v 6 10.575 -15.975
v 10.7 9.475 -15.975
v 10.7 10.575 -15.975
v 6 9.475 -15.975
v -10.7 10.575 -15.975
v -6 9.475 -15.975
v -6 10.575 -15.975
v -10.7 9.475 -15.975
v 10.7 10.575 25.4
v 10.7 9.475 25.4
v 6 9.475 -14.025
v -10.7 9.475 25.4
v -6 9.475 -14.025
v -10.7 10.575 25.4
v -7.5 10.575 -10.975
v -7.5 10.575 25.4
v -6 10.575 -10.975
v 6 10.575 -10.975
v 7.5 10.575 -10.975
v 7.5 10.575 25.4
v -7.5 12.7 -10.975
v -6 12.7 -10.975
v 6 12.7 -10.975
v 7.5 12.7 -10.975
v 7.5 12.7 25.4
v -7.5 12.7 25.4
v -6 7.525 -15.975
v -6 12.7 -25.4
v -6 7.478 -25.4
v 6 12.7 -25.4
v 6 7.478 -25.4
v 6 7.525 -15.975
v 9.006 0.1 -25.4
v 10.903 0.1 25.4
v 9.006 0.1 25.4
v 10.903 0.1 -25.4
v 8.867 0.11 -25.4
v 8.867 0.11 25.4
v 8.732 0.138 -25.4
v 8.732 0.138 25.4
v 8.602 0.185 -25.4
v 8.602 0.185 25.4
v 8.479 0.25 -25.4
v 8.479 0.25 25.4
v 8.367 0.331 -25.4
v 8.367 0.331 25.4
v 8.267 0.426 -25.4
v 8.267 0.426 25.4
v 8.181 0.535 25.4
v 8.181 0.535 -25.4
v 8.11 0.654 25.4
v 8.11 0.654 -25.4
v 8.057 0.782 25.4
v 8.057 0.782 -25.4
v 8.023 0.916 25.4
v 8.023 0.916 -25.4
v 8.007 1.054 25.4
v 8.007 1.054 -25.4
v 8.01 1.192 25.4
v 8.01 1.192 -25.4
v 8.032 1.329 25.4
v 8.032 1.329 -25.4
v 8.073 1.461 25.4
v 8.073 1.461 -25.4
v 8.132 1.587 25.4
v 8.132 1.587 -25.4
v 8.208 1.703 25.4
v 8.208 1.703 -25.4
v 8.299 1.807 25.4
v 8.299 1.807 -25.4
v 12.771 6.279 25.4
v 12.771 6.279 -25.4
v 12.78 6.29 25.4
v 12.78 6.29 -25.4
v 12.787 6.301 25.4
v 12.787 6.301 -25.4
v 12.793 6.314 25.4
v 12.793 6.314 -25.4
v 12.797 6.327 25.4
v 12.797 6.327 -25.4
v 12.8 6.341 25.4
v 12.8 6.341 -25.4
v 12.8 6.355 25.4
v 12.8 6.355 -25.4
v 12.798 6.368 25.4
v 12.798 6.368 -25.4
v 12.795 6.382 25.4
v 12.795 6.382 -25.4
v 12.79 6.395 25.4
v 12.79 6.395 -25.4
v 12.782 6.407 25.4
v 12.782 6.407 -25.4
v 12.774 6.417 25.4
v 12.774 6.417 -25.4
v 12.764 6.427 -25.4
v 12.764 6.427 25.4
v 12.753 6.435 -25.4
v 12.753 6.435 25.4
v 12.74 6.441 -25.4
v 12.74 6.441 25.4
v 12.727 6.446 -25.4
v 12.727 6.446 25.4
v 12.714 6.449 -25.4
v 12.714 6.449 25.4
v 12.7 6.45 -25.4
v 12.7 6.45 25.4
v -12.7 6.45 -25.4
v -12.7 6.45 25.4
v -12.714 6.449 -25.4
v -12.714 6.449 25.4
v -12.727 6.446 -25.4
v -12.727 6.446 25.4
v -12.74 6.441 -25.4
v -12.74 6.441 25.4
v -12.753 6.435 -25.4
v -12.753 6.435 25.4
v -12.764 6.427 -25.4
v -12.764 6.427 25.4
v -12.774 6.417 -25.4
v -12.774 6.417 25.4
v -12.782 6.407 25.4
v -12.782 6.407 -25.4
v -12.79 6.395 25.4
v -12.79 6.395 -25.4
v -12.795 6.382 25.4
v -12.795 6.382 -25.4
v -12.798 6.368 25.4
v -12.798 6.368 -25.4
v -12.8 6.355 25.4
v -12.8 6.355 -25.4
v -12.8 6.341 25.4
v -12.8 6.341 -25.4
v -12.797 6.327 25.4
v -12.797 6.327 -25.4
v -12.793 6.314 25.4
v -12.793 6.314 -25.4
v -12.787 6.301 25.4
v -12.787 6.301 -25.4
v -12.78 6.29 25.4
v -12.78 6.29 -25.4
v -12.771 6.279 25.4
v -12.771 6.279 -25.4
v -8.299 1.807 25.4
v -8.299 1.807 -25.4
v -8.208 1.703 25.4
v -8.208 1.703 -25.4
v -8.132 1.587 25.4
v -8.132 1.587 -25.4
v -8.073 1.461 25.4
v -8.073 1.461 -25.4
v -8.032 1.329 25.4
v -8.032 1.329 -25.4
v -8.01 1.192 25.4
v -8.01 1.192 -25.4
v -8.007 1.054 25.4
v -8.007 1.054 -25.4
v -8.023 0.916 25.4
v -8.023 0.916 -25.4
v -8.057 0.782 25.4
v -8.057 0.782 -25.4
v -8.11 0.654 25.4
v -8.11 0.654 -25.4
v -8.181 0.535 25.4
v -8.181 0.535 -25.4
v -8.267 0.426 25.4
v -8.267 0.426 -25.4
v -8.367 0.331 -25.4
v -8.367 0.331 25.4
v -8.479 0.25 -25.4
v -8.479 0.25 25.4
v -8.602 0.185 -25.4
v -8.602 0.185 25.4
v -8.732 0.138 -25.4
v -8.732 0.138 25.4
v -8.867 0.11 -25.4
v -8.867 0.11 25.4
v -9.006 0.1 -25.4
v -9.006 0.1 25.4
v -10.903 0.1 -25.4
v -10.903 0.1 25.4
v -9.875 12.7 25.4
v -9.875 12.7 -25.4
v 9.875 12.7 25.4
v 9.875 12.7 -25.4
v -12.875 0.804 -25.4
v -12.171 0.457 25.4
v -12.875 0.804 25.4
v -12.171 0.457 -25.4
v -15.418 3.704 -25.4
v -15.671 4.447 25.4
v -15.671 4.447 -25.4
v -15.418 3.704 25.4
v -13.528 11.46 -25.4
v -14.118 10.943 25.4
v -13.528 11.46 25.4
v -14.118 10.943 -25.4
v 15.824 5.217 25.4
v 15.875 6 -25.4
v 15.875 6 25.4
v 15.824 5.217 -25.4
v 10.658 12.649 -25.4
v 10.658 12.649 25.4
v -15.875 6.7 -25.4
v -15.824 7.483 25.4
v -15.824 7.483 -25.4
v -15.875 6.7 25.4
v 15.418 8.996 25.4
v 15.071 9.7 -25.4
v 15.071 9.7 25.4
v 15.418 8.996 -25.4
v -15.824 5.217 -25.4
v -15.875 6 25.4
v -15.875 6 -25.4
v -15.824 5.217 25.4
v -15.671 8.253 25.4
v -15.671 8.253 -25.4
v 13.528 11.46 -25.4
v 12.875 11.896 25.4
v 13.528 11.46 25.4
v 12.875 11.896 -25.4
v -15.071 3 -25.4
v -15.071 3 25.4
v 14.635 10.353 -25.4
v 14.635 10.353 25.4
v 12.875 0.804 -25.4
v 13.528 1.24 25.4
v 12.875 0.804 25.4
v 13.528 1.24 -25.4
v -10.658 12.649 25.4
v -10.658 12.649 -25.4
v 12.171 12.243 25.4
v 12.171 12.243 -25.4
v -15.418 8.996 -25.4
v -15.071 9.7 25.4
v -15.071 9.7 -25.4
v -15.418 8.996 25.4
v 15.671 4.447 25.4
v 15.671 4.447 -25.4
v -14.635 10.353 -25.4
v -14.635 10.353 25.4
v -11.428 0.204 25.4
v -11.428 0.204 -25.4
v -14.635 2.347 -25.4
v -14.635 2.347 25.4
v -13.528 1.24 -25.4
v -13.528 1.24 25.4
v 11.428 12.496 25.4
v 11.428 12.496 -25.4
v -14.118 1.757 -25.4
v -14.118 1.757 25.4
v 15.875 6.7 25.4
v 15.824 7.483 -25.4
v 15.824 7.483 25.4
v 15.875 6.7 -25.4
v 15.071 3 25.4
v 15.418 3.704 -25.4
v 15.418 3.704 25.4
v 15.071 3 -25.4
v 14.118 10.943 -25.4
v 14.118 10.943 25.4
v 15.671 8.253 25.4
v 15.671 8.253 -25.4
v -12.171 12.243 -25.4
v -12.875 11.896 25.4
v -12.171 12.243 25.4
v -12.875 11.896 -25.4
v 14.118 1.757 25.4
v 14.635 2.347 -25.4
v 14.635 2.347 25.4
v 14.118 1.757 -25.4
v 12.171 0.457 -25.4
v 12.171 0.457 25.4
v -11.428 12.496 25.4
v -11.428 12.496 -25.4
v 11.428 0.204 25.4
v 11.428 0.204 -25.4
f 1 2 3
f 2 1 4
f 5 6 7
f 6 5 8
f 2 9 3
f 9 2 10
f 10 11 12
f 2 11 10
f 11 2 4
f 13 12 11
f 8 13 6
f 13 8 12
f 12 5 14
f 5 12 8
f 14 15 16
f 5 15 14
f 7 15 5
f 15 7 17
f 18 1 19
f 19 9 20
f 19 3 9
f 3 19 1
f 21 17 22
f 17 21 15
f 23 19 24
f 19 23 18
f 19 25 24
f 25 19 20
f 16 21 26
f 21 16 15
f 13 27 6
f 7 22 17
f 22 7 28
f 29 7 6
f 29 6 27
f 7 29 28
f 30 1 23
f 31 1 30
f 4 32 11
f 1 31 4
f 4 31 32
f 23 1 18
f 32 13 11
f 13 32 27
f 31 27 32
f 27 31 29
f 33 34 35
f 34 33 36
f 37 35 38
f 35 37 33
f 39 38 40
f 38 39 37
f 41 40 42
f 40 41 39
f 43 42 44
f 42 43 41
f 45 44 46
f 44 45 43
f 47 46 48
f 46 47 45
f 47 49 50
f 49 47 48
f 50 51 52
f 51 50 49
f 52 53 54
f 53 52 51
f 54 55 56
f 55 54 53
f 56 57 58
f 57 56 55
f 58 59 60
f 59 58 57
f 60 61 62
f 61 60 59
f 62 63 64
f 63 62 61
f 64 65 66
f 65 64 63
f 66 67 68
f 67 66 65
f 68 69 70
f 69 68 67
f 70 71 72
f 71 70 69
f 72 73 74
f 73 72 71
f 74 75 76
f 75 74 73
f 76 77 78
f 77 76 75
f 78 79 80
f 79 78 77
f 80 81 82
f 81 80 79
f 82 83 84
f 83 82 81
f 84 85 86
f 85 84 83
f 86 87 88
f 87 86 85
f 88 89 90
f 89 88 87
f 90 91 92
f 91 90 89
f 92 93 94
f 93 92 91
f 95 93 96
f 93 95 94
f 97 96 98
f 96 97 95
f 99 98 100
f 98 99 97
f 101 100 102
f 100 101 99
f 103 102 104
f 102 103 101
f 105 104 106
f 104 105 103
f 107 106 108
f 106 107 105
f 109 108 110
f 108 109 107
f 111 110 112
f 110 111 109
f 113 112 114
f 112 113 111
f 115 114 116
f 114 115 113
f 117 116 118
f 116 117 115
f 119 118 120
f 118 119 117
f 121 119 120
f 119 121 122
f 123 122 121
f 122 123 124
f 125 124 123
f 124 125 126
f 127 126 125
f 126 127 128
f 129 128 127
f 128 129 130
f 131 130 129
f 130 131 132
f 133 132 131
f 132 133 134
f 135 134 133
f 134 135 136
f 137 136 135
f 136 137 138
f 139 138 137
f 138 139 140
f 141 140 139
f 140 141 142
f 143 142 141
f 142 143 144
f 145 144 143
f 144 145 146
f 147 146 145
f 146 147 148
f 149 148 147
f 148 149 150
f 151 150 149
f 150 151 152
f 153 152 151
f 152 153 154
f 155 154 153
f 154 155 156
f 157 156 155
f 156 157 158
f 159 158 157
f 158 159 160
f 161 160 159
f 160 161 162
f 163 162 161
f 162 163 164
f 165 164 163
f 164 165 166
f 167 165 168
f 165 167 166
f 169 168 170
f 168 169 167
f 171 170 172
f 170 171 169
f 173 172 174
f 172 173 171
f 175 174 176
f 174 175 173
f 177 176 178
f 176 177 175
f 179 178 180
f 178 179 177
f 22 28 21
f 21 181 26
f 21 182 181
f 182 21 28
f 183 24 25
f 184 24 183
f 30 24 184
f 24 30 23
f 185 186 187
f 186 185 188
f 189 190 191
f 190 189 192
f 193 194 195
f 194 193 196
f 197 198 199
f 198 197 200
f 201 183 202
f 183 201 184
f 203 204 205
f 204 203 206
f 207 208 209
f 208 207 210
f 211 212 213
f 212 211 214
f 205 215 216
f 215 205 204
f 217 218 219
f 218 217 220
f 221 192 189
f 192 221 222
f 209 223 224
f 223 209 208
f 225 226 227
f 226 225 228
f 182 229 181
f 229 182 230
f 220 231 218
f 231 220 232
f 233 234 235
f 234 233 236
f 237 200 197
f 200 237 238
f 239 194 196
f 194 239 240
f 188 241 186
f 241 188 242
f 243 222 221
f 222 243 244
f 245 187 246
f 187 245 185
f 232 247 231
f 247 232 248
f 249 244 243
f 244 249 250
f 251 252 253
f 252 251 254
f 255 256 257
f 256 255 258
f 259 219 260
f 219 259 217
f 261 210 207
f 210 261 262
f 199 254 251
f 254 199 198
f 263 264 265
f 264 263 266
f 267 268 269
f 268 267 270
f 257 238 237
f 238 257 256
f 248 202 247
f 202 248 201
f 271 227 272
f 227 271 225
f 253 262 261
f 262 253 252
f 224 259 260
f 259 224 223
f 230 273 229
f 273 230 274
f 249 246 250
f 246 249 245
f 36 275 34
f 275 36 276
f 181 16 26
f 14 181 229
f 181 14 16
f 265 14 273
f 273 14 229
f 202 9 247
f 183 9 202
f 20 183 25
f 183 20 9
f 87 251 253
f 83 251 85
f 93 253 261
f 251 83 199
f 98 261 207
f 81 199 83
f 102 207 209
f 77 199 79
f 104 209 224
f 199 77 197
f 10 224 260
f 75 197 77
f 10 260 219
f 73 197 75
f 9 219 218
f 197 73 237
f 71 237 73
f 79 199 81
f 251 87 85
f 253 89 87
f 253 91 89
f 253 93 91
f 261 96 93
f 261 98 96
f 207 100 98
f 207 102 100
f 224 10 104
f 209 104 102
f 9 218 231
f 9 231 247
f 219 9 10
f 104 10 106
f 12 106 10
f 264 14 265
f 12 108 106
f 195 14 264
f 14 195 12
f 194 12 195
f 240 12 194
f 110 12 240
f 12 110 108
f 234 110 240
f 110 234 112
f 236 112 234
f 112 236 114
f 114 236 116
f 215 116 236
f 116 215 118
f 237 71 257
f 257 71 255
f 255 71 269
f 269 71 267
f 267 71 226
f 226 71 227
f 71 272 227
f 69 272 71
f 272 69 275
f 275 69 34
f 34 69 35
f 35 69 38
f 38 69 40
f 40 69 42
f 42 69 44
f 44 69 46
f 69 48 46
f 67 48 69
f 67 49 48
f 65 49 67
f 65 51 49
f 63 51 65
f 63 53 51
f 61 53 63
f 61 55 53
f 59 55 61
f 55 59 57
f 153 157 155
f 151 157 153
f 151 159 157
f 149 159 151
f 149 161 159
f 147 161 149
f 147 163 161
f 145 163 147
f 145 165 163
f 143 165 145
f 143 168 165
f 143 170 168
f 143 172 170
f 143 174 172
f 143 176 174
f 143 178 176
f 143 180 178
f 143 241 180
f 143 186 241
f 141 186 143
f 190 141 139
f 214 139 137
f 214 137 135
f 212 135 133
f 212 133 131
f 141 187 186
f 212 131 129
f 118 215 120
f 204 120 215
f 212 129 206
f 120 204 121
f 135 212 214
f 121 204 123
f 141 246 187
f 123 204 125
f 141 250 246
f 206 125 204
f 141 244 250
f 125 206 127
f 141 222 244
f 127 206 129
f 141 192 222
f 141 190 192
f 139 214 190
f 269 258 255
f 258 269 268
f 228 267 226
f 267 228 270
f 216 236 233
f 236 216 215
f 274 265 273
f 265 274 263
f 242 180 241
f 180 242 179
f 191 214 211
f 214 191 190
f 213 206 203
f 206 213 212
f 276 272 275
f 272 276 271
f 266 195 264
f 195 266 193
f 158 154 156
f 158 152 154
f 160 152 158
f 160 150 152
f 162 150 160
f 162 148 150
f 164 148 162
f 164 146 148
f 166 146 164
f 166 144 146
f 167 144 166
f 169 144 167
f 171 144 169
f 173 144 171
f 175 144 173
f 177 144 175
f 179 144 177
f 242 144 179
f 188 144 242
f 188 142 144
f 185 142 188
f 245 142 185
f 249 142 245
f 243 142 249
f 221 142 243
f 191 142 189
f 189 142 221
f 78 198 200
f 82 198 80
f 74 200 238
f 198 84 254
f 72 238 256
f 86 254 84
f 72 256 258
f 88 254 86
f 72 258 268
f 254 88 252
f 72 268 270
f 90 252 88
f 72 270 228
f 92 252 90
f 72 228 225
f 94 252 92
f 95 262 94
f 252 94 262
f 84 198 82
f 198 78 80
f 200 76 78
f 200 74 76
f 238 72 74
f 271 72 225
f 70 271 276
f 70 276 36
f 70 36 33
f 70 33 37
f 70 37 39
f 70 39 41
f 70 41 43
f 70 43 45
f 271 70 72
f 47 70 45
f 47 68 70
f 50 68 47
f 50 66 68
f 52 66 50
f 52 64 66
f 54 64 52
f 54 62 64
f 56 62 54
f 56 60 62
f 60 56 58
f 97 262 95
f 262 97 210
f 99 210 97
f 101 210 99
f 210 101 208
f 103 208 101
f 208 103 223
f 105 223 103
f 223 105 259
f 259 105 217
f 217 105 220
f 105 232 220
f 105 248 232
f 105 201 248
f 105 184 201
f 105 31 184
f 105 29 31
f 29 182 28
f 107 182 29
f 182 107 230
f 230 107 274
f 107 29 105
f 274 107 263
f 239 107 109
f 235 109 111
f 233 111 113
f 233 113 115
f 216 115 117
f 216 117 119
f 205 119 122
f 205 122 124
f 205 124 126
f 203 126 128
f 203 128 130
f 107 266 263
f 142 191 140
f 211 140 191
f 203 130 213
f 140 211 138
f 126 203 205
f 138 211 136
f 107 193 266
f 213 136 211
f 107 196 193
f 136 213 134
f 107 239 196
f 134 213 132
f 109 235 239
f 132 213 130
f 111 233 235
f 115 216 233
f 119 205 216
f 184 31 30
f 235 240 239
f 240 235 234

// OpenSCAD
// file: ../lib/TOGComplexLib1.scad
function tcplx1_multiply(a, b) =
	[a[0]*b[0] - a[1]*b[1], a[0]*b[1] + a[1]*b[0]];
function tcplx1_divide(a, b) =
	let(bot = (b[0]*b[0] + b[1]*b[1]))
	[
		(a[0]*b[0] + a[1]*b[1])/bot,
		(a[1]*b[0] - a[0]*b[1])/bot
	];

assert([-11,23] == tcplx1_multiply([3,2], [1,7]));

assert([-1,3] == tcplx1_multiply([3,1], [0,1]));
assert([-1,3] == tcplx1_multiply([0,1], [3,1]));

echo(tcplx1_divide([-1,3], [3,1]));
assert([0,1] == tcplx1_divide([-1,3], [3,1]));

function tcplx1_normalize(vec) =
	let(veclen = sqrt(vec[0]*vec[0]+vec[1]*vec[1]))
	[vec[0] / veclen, vec[1] / veclen];

function tcplx1_relative_turnvec_vv(v0, v1) =
	tcplx1_divide(tcplx1_normalize(v1), tcplx1_normalize(v0));

function tcplx1_relative_turnvec_abc(p0, p1, p2) = tcplx1_relative_turnvec_vv(p1-p0, p2-p1);

// A 90-degree turn
assert([0,1] == tcplx1_relative_turnvec_abc([0,0], [1,0], [1,1]));
assert([0,1] == tcplx1_relative_turnvec_abc([0,0], [0,1], [-1,1]));

// A 45-degree turn
assert(tcplx1_normalize([1,1]) == tcplx1_relative_turnvec_abc([0,0], [1,0], [ 2,1]));
assert(tcplx1_normalize([1,1]) == tcplx1_relative_turnvec_abc([0,0], [0,1], [-1,2]));


function tcplx1_relative_angle_abc(p0, p1, p2) =
	let(turnvec = tcplx1_relative_turnvec_abc(p0, p1, p2))
	atan2(turnvec[1], turnvec[0]);

assert(-135 == tcplx1_relative_angle_abc([0,0], [1,0], [0,-1]));
assert( -90 == tcplx1_relative_angle_abc([0,0], [1,0], [1,-1]));
assert(   0 == tcplx1_relative_angle_abc([0,0], [1,0], [2, 0]));
assert(  90 == tcplx1_relative_angle_abc([0,0], [1,0], [1, 1]));
assert( 135 == tcplx1_relative_angle_abc([0,0], [1,0], [0, 1]));

assert(  90 == tcplx1_relative_angle_abc([1,1], [3,3], [1, 5]));
// file: ../lib/TOGArrayLib1.scad
// TOGArrayLib1.5
// 
// Functions for working with arrays.
// 
// v1.1:
// - tal1_reduce assert(is_list(items)) to prevent infinite recursion
//   when given undefined or other non-list values
// v1.1.1:
// - Fix tal1_uniq_remap_v2 to return "list-remap-result" as the
//   first element of the returned list
// v1.2:
// - Add tal1_replace_at function
// v1.3:
// - tal1_is_vec_of, tal1_is_vec_of_num
// v1.4:
// - tal1_assert_for_each, for when you want to assert something
//   about each of a list of items and get nice failure messages
// v1.5:
// - Add tal1_duplicate_reversed function, which may be
//   handy when generating symmetrical polygons and stuff.

/**
 * Make a list with the contents of list `a`,
 * but starting at offset `off`, replaced by the contents of list `b`.
 * len(result) = max(len(a), off+len(b))
 */
function tal1_replace_at(a, off, b, default_value=undef, default_value_function=undef) =
	assert(is_list(a))
	assert(is_list(b))
	let( _dvf = !is_undef(default_value_function) ? default_value_function : function(i) default_value )
[
	for( i=[0:1:min(off,len(a))-1] ) a[i],
	for( i=[len(a):1:off-1] ) _dvf(i),
	for( i=[off:1:off+len(b)-1] ) b[i-off],
	for( i=[off+len(b):1:len(a)-1] ) a[i],
];

// Simplest case
assert([] == tal1_replace_at([], 0, []));
// Second simplest cases
assert(["foo"] == tal1_replace_at(["foo"], 0, []));
assert(["foo"] == tal1_replace_at([], 0, ["foo"]));
// Replace one item
assert(["foo","quux","baz"] == tal1_replace_at(["foo","bar","baz"], 1, ["quux"]));
// Replace and extend
assert(["foo","quux","tuna","tina"] == tal1_replace_at(["foo","bar","baz"], 1, ["quux", "tuna", "tina"]));
// Add beyond end of `a`
assert(["foo","zzz","quux"] == tal1_replace_at(["foo"], 2, ["quux"], default_value="zzz"));
// Adding 'nothing' should still fill to that point with defaults
assert(["foo","zzz","zzz"] == tal1_replace_at(["foo"], 3, [], default_value="zzz"));


function tal1_reduce(start, items, func, offset=0) =
	assert(is_list(items))
	len(items) == offset ? start :
	tal1_reduce(func(start, items[offset]), items, func, offset+1);

function tal1_consecutive_duplicate_count(items) = tal1_reduce(
	[0, undef],
	items,
	function(z,item) [z[0] + (item == z[1] ? 1 : 0), item]
)[0];

assert(0 == tal1_consecutive_duplicate_count([]));
assert(0 == tal1_consecutive_duplicate_count([50]));
assert(1 == tal1_consecutive_duplicate_count([50,50]));
assert(0 == tal1_consecutive_duplicate_count([50,51,52,53]));
assert(1 == tal1_consecutive_duplicate_count([50,51,52,52]));
assert(3 == tal1_consecutive_duplicate_count([50,50,50,50]));

// Set test_size to arbirarily large values
// to ensure that OpenSCAD can handle heavy recursion
let(test_size=1000) assert(test_size/2 == tal1_consecutive_duplicate_count([for(i=[0:1:test_size-1]) floor(i/2)]));



function tal1_uniq_(items, off0, off1) =
	let(chunklen = off1-off0)
	chunklen == 0 ? [] :
	chunklen == 1 ? [items[off0]] :
	let(half=floor(chunklen/2))
	let(left  = tal1_uniq_(items, off0     , off0+half))
	let(right = tal1_uniq_(items, off0+half, off1     ))
	assert(len(left) > 0)
	assert(len(right) > 0)
	left[len(left)-1] == right[0] ? [each left, for(i=[1:1:len(right)-1]) right[i]] :
	[each left, each right];

/** Given a list of items, returns a new list with identical consecutive items merged */
function tal1_uniq(items) = tal1_uniq_(items, 0, len(items));

assert([] == tal1_uniq([]));
assert([123] == tal1_uniq([123]));
assert([55,0,1,2,3] == tal1_uniq([55,0,1,2,3]));
assert([55,0,1,2] == tal1_uniq([55,0,1,1,2]));
assert([55,0,1] == tal1_uniq([55,55,0,0,0,0,0,0,1,1,1,1]));
assert([55,0] == tal1_uniq([55,0,0,0,0,0,0,0]));



/**
 * Returns [new items, old index -> new index mapping].
 * No-op version.
 */
function tal1_uniq_remap_v1(items) =
	["list-remap-result", items, [for (vi=[0:1:len(items)-1]) vi]];

// [a, a, b, b, c, c]
//
// [a,    ...], []  -> [a],[0]
// [a, a, ...], [0] -> [a],[0,0]

assert([1,2,3] == [1,2,3]);

/**
 * Recursive version that will combine adjacent identical vertexes,
 * but will use the original items.
 */
function tal1_uniq_remap_v2(items, map=[]) =
	let(index = len(map))
	len(items) == index ? ["list-remap-result", items, map] :
	index == 0 ? tal1_uniq_remap_v2(items, [0]) :
	items[index] == items[map[index-1]] ? tal1_uniq_remap_v2(items, [for(vi=map) vi, map[index-1]]) :
	tal1_uniq_remap_v2(items, [for(vi=map) vi, index]);

assert(tal1_uniq_remap_v2([1,1,2,2,3,4]) == ["list-remap-result", [1,1,2,2,3,4], [0,0,2,2,4,5]]);


/**
 * Returns true if `vec` is a list of at least min_len items
 * and component_check(each item, even those beyond min_len) is true.
 */
function tal1_is_vec_of(vec, min_len=0, component_check=function(x) true) =
	assert(is_num(min_len) && min_len >= 0)
	assert(is_function(component_check))
	is_list(vec) && len(vec) >= min_len &&
	tal1_reduce(true, vec, function(prev,item) prev && component_check(item));

function tal1_is_vec_of_num(vec, min_len=0) = tal1_is_vec_of(vec, min_len, function(i) is_num(i));

assert( true == tal1_is_vec_of_num([1,2,3]));
assert( true == tal1_is_vec_of_num([]));
assert( true == tal1_is_vec_of_num([1,2,3], 3));
assert(false == tal1_is_vec_of_num([1,2], 3));
assert(false == tal1_is_vec_of_num([1,2,"spoon"], 3));
// Requirements are ambiguous when
// first min_len items are numbers, but there are non-numeric items afterwards,
// so let's error on the side of saying 'no, it's not a list of numbers';
// i.e. the item check and the min_len are independent.
assert(false == tal1_is_vec_of_num([1,2,3,"artichoke"], 3));


/**
 * Asserts that item_checker(each item in list, index of item)[0] is true.
 * Second element of item_checker return value is assertion message.
 * Returns the original list, in case that's useful to you.
 */
function tal1_assert_for_each(list, item_checker) =
	let( _ignored = [ for(i=[0:1:len(list)-1])
		let(q=item_checker(list[i],i))
		let(passed=is_bool(q) ? q : is_list(q) ? q[0] : assert(false, str(
			"tal1_assert_for_each: item_checker should return Bool|[Bool,String], but returned ",
			q, " for item at index ", i)))
		let(message=is_list(q) ? q[1] : undef)
		assert(passed, message)
		q
	])
	list;

// Callback can return a boolean...
assert([1,2,3] == tal1_assert_for_each([1,2,3], function(v,i) is_num(v)));
// ...or a [boolean, string]
assert([1,2,3] == tal1_assert_for_each([1,2,3], function(v,i) [is_num(v), "element be a num"]));

// [a, b, c] -> [a, b, c, rxf(c), rxf(b), rxf(a)]
function tal1_duplicate_reversed(list, rxf=function(item) item) =
	[
		each list,
		for( i=[len(list)-1 : -1 : 0] ) rxf(list[i]),
	];
// file: ../lib/TOGMod1Constructors.scad
// TOGMod1Constructors-v1.11
// 
// Functions to construct objects understood by TOGMod1
// 
// v1.1:
// - Add togmod1_make_rounded_rect
// v1.2:
// - togmod1_make_rounded_rect can make ovals
// v1.3:
// - togmod1_circle_points, to just get the points of a circle
// - if pos parameter to circle function has a third element,
//   returned vertexes will include it as the z component;
// v1.3.1
// - Some assertions
// v1.4:
// - Refactor togmod1_rounded_rect_points and togmod1_circle_points
//   to use togmod1__make_nd_vector_adder for adapting to whatever
//   `pos` parameter is.
// v1.5:
// - togmod_rounded_rect_points will not simplify completely rounded sides
//   (where length of side is exactly twice the rounding radius)
//   unless simplify_rounded_sides=true
//   - This makes it more useful for polyhedron generation,
//     where radius varies, but number of points must remain constant.
// v1.6:
// - togmod1_make_rect makes a simple rectangle
// - togmod1_make_rounded_rect will defer to togmod1_make_rect when r=0
// v1.7:
// - togmod1_make_circle will return empty shape (["union"]) when d=0
// v1.8:
// - Add togmod1_text
// v1.9:
// - togmod1_circle_points uses 3 as minimum circle point count instead of 6
// v1.10:
// - Fix togmod1_linear_extrude_y so that range corresponds to Y start/end and
//   polygon X,Y correspond to X,Z.  Previously it was rotated wrongly,
//   which would have gone unnoticed for symmetrical shapes centered at 0,0.
// v1.11:
// - Remove an 'echo'

use <./TOGArrayLib1.scad>

function togmod1__make_nd_vector_adder(origin=[0,0]) =
	let(origin_is_zero = tal1_reduce(true, origin, function(prev,item) prev && item == 0))
	origin_is_zero ? (function(vec) len(vec) >= len(origin) ? vec : tal1_replace_at(origin, 0, vec)) :
	function(vec) [
		for(i=[0:1:max(len(origin),len(vec))-1]) (len(vec) > i ? vec[i] : 0) + (len(origin) > i ? origin[i] : 0),
	];

assert([1,2,3] == togmod1__make_nd_vector_adder()([1,2,3]));
assert([1,2,3] == togmod1__make_nd_vector_adder([0,0,3])([1,2]));


function togmod1_make_cuboid(size) =
	assert(is_list(size))
	assert(len(size) >= 3)
	assert(is_num(size[0]))
	assert(is_num(size[1]))
	assert(is_num(size[2]))
	["polyhedron-vf", [
		[-size[0]/2, -size[1]/2, -size[2]/2],
		[+size[0]/2, -size[1]/2, -size[2]/2],
		[-size[0]/2, +size[1]/2, -size[2]/2],
		[+size[0]/2, +size[1]/2, -size[2]/2],
		[-size[0]/2, -size[1]/2, +size[2]/2],
		[+size[0]/2, -size[1]/2, +size[2]/2],
		[-size[0]/2, +size[1]/2, +size[2]/2],
		[+size[0]/2, +size[1]/2, +size[2]/2]
	], [
		[0,1,3,2],[0,4,5,1],[4,6,7,5],[3,7,6,2],[1,5,7,3],[6,4,0,2]
	]];

function togmod1_make_polygon(verts) =
	["polygon-vp", verts, [[for( i=[0:1:len(verts)-1] ) i%len(verts)]]];

function togmod1_rounded_rect_points(size, r, pos=[0,0], simplify_rounded_sides=false) =
	assert(is_list(size))
	assert(len(size) >= 2)
	let(radii = is_list(r) ? r : is_num(r) ? [r,r] : assert(false, "rounded_rect r(adius) should be list<num> or num"))
	let(rx = radii[0])
	let(ry = radii[1])
	assert(is_num(rx))
	assert(is_num(ry))
	assert(size[0] >= 2*rx, str("size[0] must be >= 2*r[0]; size[0] = ",size[0],", 2*r[0] = ",2*rx))
	assert(size[1] >= 2*ry, str("size[1] must be >= 2*r[1]; size[1] = ",size[1],", 2*r[1] = ",2*ry))
	let(quarterfn=max($fn/4, 1))
	let(qfnx = simplify_rounded_sides && size[0] == 2*rx ? quarterfn-1 : quarterfn)
	let(qfny = simplify_rounded_sides && size[1] == 2*ry ? quarterfn-1 : quarterfn)
	let(finalizepos = togmod1__make_nd_vector_adder(pos))
[
	for(a=[0 : 1 : qfnx]) let(ang=      a*90/quarterfn) finalizepos([ size[0]/2-rx + rx*cos(ang),  size[1]/2-ry + ry*sin(ang)]),
	for(a=[0 : 1 : qfny]) let(ang= 90 + a*90/quarterfn) finalizepos([-size[0]/2+rx + rx*cos(ang),  size[1]/2-ry + ry*sin(ang)]),
	for(a=[0 : 1 : qfnx]) let(ang=180 + a*90/quarterfn) finalizepos([-size[0]/2+rx + rx*cos(ang), -size[1]/2+ry + ry*sin(ang)]),
	for(a=[0 : 1 : qfny]) let(ang=270 + a*90/quarterfn) finalizepos([ size[0]/2-rx + rx*cos(ang), -size[1]/2+ry + ry*sin(ang)]),
];

function togmod1_make_rect(size) =
	togmod1_make_polygon([
		[-size[0]/2, -size[1]/2],
		[+size[0]/2, -size[1]/2],
		[+size[0]/2, +size[1]/2],
		[-size[0]/2, +size[1]/2],
	]);

function togmod1_make_rounded_rect(size, r) =
	r == 0 ? togmod1_make_rect(size) :
	togmod1_make_polygon(togmod1_rounded_rect_points(size,r,simplify_rounded_sides=true));

/**
 * Returns points for an approximation of a circle where points are at distance r from pos.
 * Can be used to make other regular polygons, but the faces will be less than that
 * distance from pos (do some trig if you want face distance, e.g. for a hex nut).
 */
function togmod1_circle_points(r, pos=[0,0], d=undef) =
	assert( !is_undef(r) || !is_undef(d) )
	assert(!is_undef(pos[0]))
	assert(!is_undef(pos[1]))
	let(finalizepos = togmod1__make_nd_vector_adder(pos))
	let(r_ = !is_undef(r) ? r : d/2)
	let(fn = max($fn, 3))
	[for(i=[0 : 1 : fn-1]) finalizepos([r_*cos(i*360/fn), r_*sin(i*360/fn)])];

function togmod1_make_circle(r, pos=[0,0], d=undef) =
	r == 0 || d == 0 ? ["union"] :
	togmod1_make_polygon(togmod1_circle_points(r=r, pos=pos, d=d));

function togmod1_make_cylinder(d, zrange=[0,1], r=undef, pos=[0,0]) =
	assert( !is_undef(r) || !is_undef(d) )
	let( r_ = !is_undef(r) ? r : d/2 )
	// TODO: Make polyhedron directly
	["linear-extrude-zs", zrange, togmod1_make_circle(r=r_, pos=pos)];

function togmod1__is_range1d(range) = is_list(range) && len(range) == 2 && is_num(range[0]) && is_num(range[1]);

function togmod1_linear_extrude_z(range, shape) =
	assert(togmod1__is_range1d(range))
	["linear-extrude-zs", range, shape];
function togmod1_linear_extrude_x(range, shape) =
	assert(togmod1__is_range1d(range))
	["rotate", [90, 0, 90], togmod1_linear_extrude_z(range, shape)];
function togmod1_linear_extrude_y(range, shape) =
	assert(togmod1__is_range1d(range))
	["rotate", [90, 0,  0], togmod1_linear_extrude_z([-range[1], -range[0]], shape)];

function togmod1_text(text, size, font, halign, valign, spacing, direction, language, script) =
	["text-tsfhvsdls", text, size, font, halign, valign, spacing, direction, language, script];
// file: ../lib/TOGMod1.scad
// TOGMod1.9
// OpenSCAD library for representing shapes
// 
// See also: Functional OpenSCAD (https://github.com/thehans/FunctionalOpenSCAD)
// 
// v1.8:
// - Add `text-tsfhvsdls`
// v1.9
// - Add `offset-ds` (offset with _d_elta a _s_hape)

module togmod1_domodule(mod) {
	assert(is_list(mod));
	assert(len(mod) > 0);
	if( mod[0] == "polygon-vp" ) {
		// ["polygon-vp", vertexes, paths]
		polygon(points=mod[1], paths=mod[2]);
	} else if( mod[0] == "polyhedron-vf" ) {
		polyhedron(mod[1], faces=mod[2]);
	} else if( mod[0] == "scale" ) {
		assert(len(mod) == 3);
		scale(mod[1]) togmod1_domodule(mod[2]);
	} else if( mod[0] == "translate" ) {
		assert(len(mod) == 3);
		assert(is_list(mod[1]));
		for(c=mod[1]) assert(is_num(c), "translate component should be numeric");
		translate(mod[1]) togmod1_domodule(mod[2]);
	} else if( mod[0] == "rotate" ) {
		assert(len(mod) == 3);
		rotate(mod[1]) togmod1_domodule(mod[2]);
	} else if( mod[0] == "intersection" ) {
		intersection_for( i=[1:1:len(mod)-1] ) togmod1_domodule(mod[i]);
	} else if( mod[0] == "difference" ) {
		difference() {
			togmod1_domodule(mod[1]);
			for( i=[2:1:len(mod)-1] ) togmod1_domodule(mod[i]);
		}
	} else if( mod[0] == "union" ) {
		for( i=[1:1:len(mod)-1] ) togmod1_domodule(mod[i]);
	} else if( mod[0] == "hull" ) {
		hull() for( i=[1:1:len(mod)-1] ) togmod1_domodule(mod[i]);
	} else if( mod[0] == "offset-rs" ) {
		assert(len(mod) == 3);
		assert(is_num(mod[1]));
		assert(is_list(mod[2]));
		offset(mod[1]) togmod1_domodule(mod[2]);
	} else if( mod[0] == "linear-extrude-zs" ) {
		// ["linear-extrude-zs", [z0,z1], 2d_shape] // centered
		// ["linear-extrude-zs", height, 2d_shape]
		let( zrange = is_list(mod[1]) ? mod[1] : [-mod[1]/2, mod[1]/2] ) {
			translate([0,0,zrange[0]]) linear_extrude(zrange[1]-zrange[0]) togmod1_domodule(mod[2]);
		}
	} else if( mod[0] == "render" ) {
		render() togmod1_domodule(mod[1]);
	} else if( mod[0] == "minkowski" ) {
		minkowski() {
			togmod1_domodule(mod[1]);
			togmod1_domodule(mod[2]);
		}
	} else if( mod[0] == "x-debug" ) {
		# togmod1_domodule(mod[1]);
	} else if( mod[0] == "x-color" ) {
		color(mod[1]) togmod1_domodule(mod[2]);
	} else if( mod[0] == "text-tsfhvsdls" ) {
		text(text=mod[1], size=mod[2], font=mod[3], halign=mod[4], valign=mod[5], spacing=mod[6], direction=mod[7], language=mod[7], script=mod[8]);
	} else if( mod[0] == "offset-ds" ) {
		assert(is_num(mod[1]));
		assert(is_list(mod[2]));
		offset(delta=mod[1]) togmod1_domodule(mod[2]);
	} else {
		assert(false, str("Unrecognized shape: ", mod[0]));
	}
}
// main file
// PicoHolder0.2
// 
// MiniRail-mounted holder for Pi Pico [W]
// 
// v0.2:
// - Fix effect of margins (was half of what it should have been in 0.1)
// - Allow x, y, z board margins to be specified separately

board_margin = [0.4, 0.1, 0.1];
minirail_margin = 0.1;
usb_cutout_depth = 2;
$fn = 48;

use <../lib/TOGMod1.scad>
use <../lib/TOGMod1Constructors.scad>
use <../lib/TOGPath1.scad>
use <../lib/TOGPolyhedronLib1.scad>

module picoholder0__end_params() { }

inch = 25.4;

pico_board_size = [21,1,51];
overhead_cutout_width = 15;
usb_plug_cutout_width = 12;

pico_cutout =
let( expanded_board_size = [for(i=[0,1,2]) pico_board_size[i]+board_margin[i]] )
let( xxpanded_board_size = [expanded_board_size[0], expanded_board_size[1], 500] )
let( overhead_cutout_size = [overhead_cutout_width, 40, 100] )
let( board_end_z = -pico_board_size[2]/2 )
let( ucd = usb_cutout_depth )
["union",
	["translate", [0,      pico_board_size[1]/2, board_end_z + 0 + xxpanded_board_size[2]/2], togmod1_make_cuboid(xxpanded_board_size)],
	["translate", [0, overhead_cutout_size[1]/2, board_end_z + 5 + overhead_cutout_size[2]/2], togmod1_make_cuboid(overhead_cutout_size)],
	["translate", [0, 0,                         board_end_z], togmod1_linear_extrude_x(
		[-usb_plug_cutout_width/2, usb_plug_cutout_width/2],
		togmod1_make_polygon([
			[- ucd,     0  ],
			[  0.5, ucd+0.5],
			[  0.5,    20  ],
			[ 10  ,    20  ],
			[ 10  ,  -200  ],
			[- 3  ,  -200  ],
		])
	)]
];

minirail_cutout =
let( caveops = [["offset", minirail_margin], ["round", max(0.05,minirail_margin)]] )
let(  vexops = [["offset", minirail_margin], ["round", 1]] )
togmod1_linear_extrude_z([-500,500], togmod1_make_polygon(togpath1_rath_to_polypoints(["togpath1-rath",
	["togpath1-rathnode", [-1/2*inch,  1/4*inch], each caveops],
	["togpath1-rathnode", [-1/4*inch,    0*inch], each  vexops],
	["togpath1-rathnode", [-100     ,    0*inch], each caveops],
	["togpath1-rathnode", [-100     , -100     ], each caveops],
	["togpath1-rathnode", [ 100     , -100     ], each caveops],
	["togpath1-rathnode", [ 100     ,    0*inch], each caveops],
	["togpath1-rathnode", [ 1/4*inch,    0*inch], each  vexops],
	["togpath1-rathnode", [ 1/2*inch,  1/4*inch], each caveops],
])));

board_pos = [0, 3/8*inch, 3/8*inch];
hull_size = [1.25*inch, 0.5*inch, 2*inch];

if( $preview ) togmod1_domodule(["x-color", "green", ["translate", board_pos + [0, pico_board_size[1]/2, 0], togmod1_make_cuboid(pico_board_size)]]);
togmod1_domodule(["difference",
	["translate", [0,hull_size[1]/2,0], tphl1_make_rounded_cuboid(hull_size, r=[6,6,0])],
	
	["translate", board_pos, pico_cutout],
	minirail_cutout,
]);
